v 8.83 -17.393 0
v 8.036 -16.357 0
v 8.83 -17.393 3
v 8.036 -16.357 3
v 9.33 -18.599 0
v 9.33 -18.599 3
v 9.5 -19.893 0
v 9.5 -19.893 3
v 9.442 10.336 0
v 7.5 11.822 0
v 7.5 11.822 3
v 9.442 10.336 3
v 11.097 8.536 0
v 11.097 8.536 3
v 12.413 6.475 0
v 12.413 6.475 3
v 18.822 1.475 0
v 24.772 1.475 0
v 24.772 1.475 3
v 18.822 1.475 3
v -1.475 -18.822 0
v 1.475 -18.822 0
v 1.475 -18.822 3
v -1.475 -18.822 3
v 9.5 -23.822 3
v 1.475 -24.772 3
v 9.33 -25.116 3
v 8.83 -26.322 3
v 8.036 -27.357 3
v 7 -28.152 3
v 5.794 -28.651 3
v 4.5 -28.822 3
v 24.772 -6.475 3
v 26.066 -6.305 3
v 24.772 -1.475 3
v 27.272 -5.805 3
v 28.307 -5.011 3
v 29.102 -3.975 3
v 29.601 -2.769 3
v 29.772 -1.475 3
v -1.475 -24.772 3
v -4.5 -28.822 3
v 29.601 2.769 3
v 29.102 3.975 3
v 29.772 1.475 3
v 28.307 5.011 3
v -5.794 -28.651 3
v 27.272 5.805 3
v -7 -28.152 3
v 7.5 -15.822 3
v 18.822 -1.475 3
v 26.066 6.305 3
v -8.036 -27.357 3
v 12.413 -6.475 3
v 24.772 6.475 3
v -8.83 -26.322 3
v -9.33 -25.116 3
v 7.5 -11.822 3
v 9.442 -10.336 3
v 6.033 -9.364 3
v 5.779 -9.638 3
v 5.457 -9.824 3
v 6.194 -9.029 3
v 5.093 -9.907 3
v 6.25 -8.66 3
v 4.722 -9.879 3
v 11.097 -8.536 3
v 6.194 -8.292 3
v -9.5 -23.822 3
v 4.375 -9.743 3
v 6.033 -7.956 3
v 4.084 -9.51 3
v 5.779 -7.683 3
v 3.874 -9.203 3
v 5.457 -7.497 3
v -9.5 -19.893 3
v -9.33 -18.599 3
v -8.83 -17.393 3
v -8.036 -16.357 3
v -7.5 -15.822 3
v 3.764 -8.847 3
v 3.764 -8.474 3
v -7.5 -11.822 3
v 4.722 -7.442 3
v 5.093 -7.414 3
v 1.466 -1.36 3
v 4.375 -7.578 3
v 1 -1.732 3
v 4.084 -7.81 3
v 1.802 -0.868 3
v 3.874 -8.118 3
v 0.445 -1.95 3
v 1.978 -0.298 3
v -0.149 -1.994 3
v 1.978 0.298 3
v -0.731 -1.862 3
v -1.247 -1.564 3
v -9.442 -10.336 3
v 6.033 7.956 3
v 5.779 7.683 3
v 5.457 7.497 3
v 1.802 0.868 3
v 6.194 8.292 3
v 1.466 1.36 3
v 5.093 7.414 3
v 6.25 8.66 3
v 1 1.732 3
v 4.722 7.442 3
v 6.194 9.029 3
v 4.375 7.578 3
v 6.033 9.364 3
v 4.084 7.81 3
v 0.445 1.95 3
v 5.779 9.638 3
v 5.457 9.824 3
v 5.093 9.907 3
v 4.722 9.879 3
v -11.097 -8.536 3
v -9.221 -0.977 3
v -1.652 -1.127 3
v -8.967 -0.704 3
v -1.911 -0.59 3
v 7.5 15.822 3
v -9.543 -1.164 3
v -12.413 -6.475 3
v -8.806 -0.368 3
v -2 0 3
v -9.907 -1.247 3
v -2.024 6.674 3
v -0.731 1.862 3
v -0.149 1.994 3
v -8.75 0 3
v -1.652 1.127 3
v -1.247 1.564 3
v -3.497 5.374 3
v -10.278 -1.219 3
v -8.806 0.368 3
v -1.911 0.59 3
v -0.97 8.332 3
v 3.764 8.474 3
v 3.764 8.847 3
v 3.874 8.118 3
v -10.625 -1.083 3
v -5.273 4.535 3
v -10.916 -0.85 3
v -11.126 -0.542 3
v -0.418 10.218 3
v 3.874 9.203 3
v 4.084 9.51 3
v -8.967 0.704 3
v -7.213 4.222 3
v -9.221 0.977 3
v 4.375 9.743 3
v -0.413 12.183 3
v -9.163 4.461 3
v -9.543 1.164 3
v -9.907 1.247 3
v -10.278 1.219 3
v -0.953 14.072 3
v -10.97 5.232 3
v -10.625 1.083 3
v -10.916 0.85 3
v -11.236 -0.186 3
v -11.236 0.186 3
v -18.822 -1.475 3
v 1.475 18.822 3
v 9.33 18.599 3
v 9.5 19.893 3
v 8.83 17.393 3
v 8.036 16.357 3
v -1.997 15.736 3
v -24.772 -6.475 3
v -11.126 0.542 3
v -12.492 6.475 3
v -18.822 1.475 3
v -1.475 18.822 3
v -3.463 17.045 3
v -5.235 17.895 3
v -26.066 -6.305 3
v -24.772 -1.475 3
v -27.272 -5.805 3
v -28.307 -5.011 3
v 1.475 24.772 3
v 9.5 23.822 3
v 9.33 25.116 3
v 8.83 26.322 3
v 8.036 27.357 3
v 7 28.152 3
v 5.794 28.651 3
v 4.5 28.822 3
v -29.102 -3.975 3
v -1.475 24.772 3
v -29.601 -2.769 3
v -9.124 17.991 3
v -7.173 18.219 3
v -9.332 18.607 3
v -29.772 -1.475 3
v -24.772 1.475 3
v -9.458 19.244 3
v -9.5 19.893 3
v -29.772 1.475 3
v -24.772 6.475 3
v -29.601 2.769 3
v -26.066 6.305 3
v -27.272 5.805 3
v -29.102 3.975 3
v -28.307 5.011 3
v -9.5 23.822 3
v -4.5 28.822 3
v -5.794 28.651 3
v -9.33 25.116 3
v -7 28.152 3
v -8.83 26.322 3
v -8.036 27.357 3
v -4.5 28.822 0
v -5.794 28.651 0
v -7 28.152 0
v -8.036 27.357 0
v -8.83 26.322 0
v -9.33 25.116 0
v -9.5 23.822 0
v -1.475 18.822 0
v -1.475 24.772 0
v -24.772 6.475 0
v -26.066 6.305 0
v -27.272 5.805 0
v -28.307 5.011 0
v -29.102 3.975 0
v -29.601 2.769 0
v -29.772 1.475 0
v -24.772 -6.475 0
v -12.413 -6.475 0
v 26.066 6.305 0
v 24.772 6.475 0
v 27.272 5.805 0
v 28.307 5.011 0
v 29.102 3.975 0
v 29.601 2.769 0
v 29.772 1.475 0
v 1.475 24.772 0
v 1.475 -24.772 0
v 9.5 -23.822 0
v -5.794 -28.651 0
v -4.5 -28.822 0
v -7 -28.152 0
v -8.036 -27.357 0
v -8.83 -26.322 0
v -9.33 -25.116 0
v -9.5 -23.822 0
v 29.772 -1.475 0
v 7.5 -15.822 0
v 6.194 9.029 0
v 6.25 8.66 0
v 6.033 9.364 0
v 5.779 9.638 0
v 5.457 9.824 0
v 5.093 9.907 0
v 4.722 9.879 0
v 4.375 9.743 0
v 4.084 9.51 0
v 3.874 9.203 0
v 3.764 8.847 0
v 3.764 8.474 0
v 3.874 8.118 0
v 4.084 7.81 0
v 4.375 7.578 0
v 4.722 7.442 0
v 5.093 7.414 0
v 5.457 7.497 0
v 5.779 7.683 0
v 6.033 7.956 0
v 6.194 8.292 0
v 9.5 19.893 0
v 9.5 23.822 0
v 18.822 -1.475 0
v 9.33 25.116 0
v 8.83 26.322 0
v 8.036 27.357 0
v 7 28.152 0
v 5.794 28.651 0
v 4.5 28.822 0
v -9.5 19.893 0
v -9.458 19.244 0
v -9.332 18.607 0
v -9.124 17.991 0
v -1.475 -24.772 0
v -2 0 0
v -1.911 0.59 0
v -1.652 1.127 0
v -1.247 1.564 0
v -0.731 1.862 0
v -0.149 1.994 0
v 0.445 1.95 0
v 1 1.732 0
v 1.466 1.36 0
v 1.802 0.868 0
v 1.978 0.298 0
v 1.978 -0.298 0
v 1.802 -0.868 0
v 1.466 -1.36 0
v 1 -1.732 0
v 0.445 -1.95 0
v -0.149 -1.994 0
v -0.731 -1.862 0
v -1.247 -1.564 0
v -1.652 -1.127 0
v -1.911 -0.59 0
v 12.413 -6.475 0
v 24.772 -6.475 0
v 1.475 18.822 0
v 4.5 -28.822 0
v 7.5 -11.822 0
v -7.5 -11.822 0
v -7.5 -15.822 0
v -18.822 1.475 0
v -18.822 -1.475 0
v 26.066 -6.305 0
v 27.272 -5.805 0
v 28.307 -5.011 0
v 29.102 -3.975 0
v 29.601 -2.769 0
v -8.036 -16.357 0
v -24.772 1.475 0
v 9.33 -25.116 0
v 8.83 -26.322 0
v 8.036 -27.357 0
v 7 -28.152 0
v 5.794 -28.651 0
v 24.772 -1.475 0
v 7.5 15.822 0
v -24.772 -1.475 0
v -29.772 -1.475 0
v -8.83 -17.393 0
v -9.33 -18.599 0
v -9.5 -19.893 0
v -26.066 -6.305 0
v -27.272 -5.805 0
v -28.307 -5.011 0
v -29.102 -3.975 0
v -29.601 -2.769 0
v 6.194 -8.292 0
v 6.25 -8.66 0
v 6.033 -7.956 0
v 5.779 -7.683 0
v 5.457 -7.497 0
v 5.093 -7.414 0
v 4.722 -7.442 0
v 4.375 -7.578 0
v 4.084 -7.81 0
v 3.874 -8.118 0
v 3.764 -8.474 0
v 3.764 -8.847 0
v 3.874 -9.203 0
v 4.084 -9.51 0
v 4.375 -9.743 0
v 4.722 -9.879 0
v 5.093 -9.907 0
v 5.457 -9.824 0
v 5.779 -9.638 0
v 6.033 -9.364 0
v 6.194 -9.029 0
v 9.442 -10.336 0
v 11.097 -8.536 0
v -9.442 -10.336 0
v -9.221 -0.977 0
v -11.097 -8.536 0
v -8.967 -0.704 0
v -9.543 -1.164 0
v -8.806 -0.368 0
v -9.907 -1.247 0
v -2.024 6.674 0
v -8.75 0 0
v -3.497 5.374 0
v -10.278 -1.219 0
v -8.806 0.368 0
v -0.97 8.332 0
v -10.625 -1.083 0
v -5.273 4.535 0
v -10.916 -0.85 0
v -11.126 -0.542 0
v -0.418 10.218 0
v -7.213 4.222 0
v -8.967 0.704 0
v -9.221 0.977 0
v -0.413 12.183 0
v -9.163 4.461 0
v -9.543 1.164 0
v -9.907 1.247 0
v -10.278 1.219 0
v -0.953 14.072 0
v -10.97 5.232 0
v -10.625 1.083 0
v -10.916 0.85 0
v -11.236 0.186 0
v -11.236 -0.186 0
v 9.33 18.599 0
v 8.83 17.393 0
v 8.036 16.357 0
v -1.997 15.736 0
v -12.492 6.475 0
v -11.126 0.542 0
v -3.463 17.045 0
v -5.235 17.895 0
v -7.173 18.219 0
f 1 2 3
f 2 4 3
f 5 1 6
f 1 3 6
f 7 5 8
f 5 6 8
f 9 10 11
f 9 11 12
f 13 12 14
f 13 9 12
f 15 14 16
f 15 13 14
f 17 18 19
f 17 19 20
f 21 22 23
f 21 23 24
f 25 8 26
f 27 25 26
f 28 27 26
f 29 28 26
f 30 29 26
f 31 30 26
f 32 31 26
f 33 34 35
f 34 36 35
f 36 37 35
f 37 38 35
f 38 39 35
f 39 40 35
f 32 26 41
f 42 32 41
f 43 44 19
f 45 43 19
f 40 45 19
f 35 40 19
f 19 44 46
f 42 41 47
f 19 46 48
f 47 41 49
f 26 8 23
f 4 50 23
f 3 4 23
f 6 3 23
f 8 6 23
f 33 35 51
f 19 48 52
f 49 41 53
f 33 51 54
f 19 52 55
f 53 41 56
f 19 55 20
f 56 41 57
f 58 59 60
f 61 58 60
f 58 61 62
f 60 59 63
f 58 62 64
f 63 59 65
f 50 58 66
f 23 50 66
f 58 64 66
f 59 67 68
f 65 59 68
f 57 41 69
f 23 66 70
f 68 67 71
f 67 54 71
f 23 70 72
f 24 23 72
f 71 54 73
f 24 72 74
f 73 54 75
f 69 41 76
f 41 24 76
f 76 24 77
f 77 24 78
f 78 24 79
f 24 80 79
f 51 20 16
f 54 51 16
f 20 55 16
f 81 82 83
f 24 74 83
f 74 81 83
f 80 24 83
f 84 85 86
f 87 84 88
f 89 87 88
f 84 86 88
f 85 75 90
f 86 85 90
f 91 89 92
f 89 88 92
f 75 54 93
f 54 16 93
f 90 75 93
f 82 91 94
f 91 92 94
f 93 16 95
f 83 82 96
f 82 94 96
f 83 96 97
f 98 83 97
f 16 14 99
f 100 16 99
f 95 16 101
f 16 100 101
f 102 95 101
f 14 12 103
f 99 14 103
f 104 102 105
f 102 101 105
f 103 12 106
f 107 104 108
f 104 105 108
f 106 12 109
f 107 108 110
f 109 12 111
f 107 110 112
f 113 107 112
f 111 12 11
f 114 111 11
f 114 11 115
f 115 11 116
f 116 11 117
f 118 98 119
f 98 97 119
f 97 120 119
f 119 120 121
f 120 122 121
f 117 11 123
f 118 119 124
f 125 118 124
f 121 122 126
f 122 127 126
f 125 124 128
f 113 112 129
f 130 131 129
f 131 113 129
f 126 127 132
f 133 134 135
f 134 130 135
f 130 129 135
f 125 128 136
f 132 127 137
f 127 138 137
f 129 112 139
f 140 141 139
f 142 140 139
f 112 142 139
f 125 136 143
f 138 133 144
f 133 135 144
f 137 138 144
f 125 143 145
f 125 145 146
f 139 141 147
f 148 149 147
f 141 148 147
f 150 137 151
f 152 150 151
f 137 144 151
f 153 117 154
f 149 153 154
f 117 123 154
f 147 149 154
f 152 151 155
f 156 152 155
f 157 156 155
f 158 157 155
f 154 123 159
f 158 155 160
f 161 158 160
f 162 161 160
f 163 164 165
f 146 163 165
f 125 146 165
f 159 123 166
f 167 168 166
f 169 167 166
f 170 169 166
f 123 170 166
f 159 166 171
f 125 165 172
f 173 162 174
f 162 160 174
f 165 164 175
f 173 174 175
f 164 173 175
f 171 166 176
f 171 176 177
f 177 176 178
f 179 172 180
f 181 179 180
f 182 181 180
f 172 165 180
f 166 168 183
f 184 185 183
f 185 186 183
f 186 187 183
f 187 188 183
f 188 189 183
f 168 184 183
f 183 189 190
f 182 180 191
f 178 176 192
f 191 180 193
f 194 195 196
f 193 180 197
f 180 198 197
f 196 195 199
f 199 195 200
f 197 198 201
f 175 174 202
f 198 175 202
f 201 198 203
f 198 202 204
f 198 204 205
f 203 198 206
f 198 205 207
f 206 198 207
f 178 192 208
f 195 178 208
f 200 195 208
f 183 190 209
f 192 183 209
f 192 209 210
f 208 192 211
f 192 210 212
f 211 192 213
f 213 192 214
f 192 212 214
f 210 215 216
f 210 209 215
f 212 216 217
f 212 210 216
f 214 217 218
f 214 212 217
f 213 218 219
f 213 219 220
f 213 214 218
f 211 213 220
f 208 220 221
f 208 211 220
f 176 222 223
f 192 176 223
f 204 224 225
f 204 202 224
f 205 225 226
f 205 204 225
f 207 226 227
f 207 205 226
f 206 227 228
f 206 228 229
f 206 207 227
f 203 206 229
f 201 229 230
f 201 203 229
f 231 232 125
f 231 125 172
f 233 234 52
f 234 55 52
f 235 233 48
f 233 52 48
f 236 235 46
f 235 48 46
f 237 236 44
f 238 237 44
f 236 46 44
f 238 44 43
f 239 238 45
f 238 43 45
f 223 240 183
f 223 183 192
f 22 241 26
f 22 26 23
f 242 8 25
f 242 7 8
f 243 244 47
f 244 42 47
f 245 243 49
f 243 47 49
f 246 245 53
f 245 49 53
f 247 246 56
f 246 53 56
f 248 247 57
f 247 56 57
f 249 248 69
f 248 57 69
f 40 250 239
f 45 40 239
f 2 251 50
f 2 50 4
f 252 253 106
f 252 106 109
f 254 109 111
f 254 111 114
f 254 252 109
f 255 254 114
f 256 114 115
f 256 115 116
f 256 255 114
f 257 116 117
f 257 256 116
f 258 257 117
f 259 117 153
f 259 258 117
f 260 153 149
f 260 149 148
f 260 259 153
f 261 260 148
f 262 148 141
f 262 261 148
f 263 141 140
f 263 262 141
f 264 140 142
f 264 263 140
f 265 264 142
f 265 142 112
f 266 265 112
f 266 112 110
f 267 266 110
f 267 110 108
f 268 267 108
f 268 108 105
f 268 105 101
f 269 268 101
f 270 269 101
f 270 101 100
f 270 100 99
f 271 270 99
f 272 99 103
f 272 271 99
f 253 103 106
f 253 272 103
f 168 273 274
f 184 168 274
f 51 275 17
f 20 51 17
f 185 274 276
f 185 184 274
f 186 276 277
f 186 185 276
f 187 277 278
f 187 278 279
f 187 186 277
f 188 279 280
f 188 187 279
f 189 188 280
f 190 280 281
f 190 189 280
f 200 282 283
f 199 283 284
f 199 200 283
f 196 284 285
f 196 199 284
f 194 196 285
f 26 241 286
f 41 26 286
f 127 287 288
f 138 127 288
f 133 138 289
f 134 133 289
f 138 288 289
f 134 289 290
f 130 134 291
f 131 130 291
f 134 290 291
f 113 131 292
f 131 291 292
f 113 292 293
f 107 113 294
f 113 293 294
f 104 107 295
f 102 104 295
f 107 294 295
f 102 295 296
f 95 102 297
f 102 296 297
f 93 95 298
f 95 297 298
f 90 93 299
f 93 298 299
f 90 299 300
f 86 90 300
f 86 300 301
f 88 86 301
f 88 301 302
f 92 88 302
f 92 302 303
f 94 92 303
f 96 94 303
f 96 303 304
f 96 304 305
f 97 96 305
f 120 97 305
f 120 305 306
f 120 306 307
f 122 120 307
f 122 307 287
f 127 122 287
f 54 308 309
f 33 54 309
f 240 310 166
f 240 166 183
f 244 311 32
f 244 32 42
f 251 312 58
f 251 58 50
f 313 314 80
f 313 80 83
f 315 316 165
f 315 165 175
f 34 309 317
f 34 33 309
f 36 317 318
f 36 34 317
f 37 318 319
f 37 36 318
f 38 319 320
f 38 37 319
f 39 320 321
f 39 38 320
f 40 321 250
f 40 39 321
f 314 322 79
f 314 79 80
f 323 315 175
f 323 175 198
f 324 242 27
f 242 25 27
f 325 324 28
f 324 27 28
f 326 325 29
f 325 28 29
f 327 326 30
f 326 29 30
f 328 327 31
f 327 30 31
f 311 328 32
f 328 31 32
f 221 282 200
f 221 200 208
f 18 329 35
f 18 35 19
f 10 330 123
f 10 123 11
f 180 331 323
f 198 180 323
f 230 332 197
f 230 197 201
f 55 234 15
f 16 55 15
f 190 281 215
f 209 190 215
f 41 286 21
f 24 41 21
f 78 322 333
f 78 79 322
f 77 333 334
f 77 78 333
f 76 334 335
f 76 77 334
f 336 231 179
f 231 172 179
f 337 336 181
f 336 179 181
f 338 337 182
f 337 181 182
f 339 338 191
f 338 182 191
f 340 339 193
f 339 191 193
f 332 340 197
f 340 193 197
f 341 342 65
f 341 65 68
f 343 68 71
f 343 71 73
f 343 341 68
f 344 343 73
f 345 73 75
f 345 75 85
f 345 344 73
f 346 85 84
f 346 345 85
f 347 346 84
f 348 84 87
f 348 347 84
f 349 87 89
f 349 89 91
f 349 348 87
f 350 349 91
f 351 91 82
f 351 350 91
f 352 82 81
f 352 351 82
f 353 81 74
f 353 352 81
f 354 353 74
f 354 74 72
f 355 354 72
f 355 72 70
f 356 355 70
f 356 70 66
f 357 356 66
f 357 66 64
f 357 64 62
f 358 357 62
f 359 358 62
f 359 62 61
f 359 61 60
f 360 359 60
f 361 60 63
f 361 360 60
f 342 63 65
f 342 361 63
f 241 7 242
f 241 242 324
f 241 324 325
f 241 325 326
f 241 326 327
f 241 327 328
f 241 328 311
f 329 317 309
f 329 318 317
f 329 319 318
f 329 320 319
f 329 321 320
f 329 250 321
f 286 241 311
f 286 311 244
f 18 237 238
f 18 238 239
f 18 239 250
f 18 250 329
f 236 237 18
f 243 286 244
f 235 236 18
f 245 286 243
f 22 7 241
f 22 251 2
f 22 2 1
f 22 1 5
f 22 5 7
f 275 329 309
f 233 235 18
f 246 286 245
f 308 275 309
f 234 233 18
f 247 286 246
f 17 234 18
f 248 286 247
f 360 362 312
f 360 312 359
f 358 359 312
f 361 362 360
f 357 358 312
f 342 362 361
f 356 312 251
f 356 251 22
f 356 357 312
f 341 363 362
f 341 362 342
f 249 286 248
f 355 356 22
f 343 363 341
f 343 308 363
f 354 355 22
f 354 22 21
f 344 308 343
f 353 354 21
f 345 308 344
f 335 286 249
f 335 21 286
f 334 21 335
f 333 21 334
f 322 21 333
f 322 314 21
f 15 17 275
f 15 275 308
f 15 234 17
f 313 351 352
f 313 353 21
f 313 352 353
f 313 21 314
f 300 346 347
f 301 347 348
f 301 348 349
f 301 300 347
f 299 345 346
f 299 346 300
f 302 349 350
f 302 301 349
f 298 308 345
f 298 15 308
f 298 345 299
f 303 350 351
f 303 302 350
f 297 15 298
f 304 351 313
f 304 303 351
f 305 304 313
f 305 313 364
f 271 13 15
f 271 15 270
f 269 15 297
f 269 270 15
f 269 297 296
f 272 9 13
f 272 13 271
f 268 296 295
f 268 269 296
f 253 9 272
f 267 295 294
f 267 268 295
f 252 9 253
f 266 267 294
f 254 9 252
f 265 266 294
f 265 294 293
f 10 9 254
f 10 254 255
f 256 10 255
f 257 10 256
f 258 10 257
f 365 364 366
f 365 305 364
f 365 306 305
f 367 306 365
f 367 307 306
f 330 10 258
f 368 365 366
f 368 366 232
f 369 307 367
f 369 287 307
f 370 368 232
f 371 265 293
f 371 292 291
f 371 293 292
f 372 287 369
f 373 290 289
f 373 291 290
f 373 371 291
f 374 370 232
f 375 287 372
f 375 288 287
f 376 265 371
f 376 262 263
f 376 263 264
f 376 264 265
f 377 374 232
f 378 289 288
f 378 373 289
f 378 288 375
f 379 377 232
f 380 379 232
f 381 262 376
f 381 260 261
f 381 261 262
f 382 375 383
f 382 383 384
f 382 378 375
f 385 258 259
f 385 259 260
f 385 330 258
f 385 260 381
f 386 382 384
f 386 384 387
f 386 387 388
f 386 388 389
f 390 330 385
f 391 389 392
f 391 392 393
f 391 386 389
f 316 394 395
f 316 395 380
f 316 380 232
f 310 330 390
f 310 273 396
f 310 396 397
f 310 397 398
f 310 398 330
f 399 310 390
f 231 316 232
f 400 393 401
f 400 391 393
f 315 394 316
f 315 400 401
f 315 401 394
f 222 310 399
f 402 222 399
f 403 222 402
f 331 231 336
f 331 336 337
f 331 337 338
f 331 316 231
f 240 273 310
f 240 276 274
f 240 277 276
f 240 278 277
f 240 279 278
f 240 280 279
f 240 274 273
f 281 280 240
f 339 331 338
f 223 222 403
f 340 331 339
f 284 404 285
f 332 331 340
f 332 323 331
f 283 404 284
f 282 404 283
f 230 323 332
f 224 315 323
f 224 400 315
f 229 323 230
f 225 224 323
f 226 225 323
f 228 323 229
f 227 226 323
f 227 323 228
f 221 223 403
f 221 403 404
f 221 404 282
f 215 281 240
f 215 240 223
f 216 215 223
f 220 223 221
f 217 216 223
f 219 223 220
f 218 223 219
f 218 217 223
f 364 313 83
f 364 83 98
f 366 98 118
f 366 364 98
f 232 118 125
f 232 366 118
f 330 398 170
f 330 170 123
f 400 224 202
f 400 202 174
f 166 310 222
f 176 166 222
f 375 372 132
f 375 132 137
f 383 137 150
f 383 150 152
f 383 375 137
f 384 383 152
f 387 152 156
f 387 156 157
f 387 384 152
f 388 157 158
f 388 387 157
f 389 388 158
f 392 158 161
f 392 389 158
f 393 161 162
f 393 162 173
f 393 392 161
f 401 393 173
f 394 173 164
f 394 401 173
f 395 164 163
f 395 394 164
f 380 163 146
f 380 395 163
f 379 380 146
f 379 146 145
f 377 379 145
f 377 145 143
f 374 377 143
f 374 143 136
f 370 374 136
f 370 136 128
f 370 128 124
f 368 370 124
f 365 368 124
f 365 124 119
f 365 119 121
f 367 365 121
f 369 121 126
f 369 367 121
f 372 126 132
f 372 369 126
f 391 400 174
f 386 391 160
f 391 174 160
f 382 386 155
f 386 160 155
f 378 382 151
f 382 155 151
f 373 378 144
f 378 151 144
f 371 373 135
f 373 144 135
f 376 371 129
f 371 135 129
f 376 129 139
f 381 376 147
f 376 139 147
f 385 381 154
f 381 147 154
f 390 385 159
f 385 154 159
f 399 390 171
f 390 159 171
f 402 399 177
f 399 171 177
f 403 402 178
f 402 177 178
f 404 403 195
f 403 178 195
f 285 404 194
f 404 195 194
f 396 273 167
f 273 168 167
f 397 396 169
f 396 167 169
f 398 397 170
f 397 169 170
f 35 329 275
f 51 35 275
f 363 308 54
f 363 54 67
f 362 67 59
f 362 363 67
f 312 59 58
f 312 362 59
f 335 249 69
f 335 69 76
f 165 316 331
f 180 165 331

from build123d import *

# Parameters (mm, degrees)
SKETCH1_R           = 1.25
BOSS_EXTRUDE1_DEPTH = 3
SKETCH2_W           = 19
SKETCH2_H           = 10
BOSS_EXTRUDE2_DEPTH = 3
SKETCH3_R           = 2
CUT_EXTRUDE1_DEPTH  = 10
SKETCH4_W           = 2.95
SKETCH4_H           = 5.95
CUT_EXTRUDE2_DEPTH  = 33.182045836
FILLET1_R           = 5
SKETCH5_W           = 5.95
SKETCH5_H           = 2.95
BOSS_EXTRUDE3_DEPTH = 3
FILLET2_R           = 5
SKETCH6_R           = 7
CUT_EXTRUDE4_DEPTH  = 10


with BuildPart() as part:
    # Sketch1 → Boss-Extrude1 (new body)
    with BuildSketch(Plane.XY):
        with BuildLine():
            Line((7.5, 18.821590418), (9.5, 18.821590418))
            Line((9.5, 18.821590418), (9.5, 17.821590418))
            Line((9.5, 17.821590418), (7.5, 15.821590418))
            Line((7.5, 15.821590418), (7.5, 11.821590418))
            ThreePointArc((7.5, 11.821590418), (14, 0), (7.5, -11.821590418))
            Line((7.5, -11.821590418), (7.5, -15.821590418))
            Line((7.5, -15.821590418), (9.5, -17.821590418))
            Line((9.5, -17.821590418), (9.5, -18.821590418))
            Line((9.5, -18.821590418), (7.5, -18.821590418))
            Line((7.5, -18.821590418), (-7.5, -18.821590418))
            Line((-7.5, -18.821590418), (-9.5, -18.821590418))
            Line((-9.5, -18.821590418), (-9.5, -17.821590418))
            Line((-9.5, -17.821590418), (-7.5, -15.821590418))
            Line((-7.5, -15.821590418), (-7.5, -11.821590418))
            ThreePointArc((-7.5, -11.821590418), (-14, 0), (-7.5, 11.821590418))
            Line((-7.5, 11.821590418), (-7.5, 15.821590418))
            Line((-7.5, 15.821590418), (-9.5, 17.821590418))
            Line((-9.5, 17.821590418), (-9.5, 18.821590418))
            Line((-9.5, 18.821590418), (-7.5, 18.821590418))
            Line((-7.5, 18.821590418), (7.5, 18.821590418))
        make_face()
        with Locations((-10, 0)):
            Circle(SKETCH1_R, mode=Mode.SUBTRACT)
        with Locations((5, 8.660254038)):
            Circle(SKETCH1_R, mode=Mode.SUBTRACT)
        with Locations((5, -8.660254038)):
            Circle(SKETCH1_R, mode=Mode.SUBTRACT)
    extrude(amount=BOSS_EXTRUDE1_DEPTH)

    # Sketch2 → Boss-Extrude2 (add)
    with BuildSketch(Plane(origin=(0, 0, 0), x_dir=(-1, 0, 0), z_dir=(0, 0, -1))):
        with Locations((0, 23.821590418)):
            Rectangle(SKETCH2_W, SKETCH2_H)
        with Locations((0, -23.821590418)):
            Rectangle(SKETCH2_W, SKETCH2_H)
    extrude(amount=-BOSS_EXTRUDE2_DEPTH)

    # Sketch3 → Cut-Extrude1 (cut)
    with BuildSketch(Plane(origin=(0, 0, 0), x_dir=(-1, 0, 0), z_dir=(0, 0, -1))):
        Circle(SKETCH3_R)
    extrude(amount=-CUT_EXTRUDE1_DEPTH, mode=Mode.SUBTRACT)

    # Sketch4 → Cut-Extrude2 (cut, through all)
    with BuildSketch(Plane(origin=(0, 0, 0), x_dir=(-1, 0, 0), z_dir=(0, 0, -1))):
        with Locations((0, 21.796590418)):
            Rectangle(SKETCH4_W, SKETCH4_H)
        with Locations((0, -21.796590418)):
            Rectangle(SKETCH4_W, SKETCH4_H)
    extrude(amount=-CUT_EXTRUDE2_DEPTH, mode=Mode.SUBTRACT)

    # Fillet1
    fillet1_edges = [part.edges().sort_by_distance(p)[0] for p in [
        (9.5, -17.821590418, 1.5),
        (-9.5, -17.821590418, 1.5),
        (-9.5, 17.821590418, 1.5),
        (9.5, 17.821590418, 1.5),
        (-9.5, 28.821590418, 1.5),
        (9.5, 28.821590418, 1.5),
        (-9.5, -28.821590418, 1.5),
        (9.5, -28.821590418, 1.5),
    ]]
    fillet(fillet1_edges, radius=FILLET1_R)

    # Sketch5 → Boss-Extrude3 (add)
    # profile 1 of 2: a face of its own
    with BuildSketch(Plane(origin=(0, 0, 0), x_dir=(-1, 0, 0), z_dir=(0, 0, -1))):
        with BuildLine():
            Line((-12.412669938, -6.475), (-29.771590418, -6.475))
            Line((-29.771590418, -6.475), (-29.771590418, 6.475))
            Line((-29.771590418, 6.475), (-12.412669938, 6.475))
            ThreePointArc((-12.412669938, 6.475), (-14, 0), (-12.412669938, -6.475))
        make_face()
        with Locations((-21.796590418, 0)):
            Rectangle(SKETCH5_W, SKETCH5_H, mode=Mode.SUBTRACT)
    # profile 2 of 2: a face of its own
    with BuildSketch(Plane(origin=(0, 0, 0), x_dir=(-1, 0, 0), z_dir=(0, 0, -1))):
        with BuildLine():
            Line((29.771590418, 6.475), (12.412669938, 6.475))
            ThreePointArc((12.412669938, 6.475), (14, 0), (12.412669938, -6.475))
            Line((12.412669938, -6.475), (29.771590418, -6.475))
            Line((29.771590418, -6.475), (29.771590418, 6.475))
        make_face()
        with Locations((21.796590418, 0)):
            Rectangle(SKETCH5_W, SKETCH5_H, mode=Mode.SUBTRACT)
    extrude(amount=-BOSS_EXTRUDE3_DEPTH)

    # Fillet2
    fillet2_edges = [part.edges().sort_by_distance(p)[0] for p in [
        (-29.771590418, 6.475, 1.5),
        (-29.771590418, -6.475, 1.5),
        (29.771590418, -6.475, 1.5),
        (29.771590418, 6.475, 1.5),
    ]]
    fillet(fillet2_edges, radius=FILLET2_R)

    # Sketch6 → Cut-Extrude4 (cut)
    with BuildSketch(Plane.XY.offset(3)):
        with Locations((-7.346152109, 11.220655855)):
            Circle(SKETCH6_R)
    extrude(amount=-CUT_EXTRUDE4_DEPTH, mode=Mode.SUBTRACT)


solid = part.part
